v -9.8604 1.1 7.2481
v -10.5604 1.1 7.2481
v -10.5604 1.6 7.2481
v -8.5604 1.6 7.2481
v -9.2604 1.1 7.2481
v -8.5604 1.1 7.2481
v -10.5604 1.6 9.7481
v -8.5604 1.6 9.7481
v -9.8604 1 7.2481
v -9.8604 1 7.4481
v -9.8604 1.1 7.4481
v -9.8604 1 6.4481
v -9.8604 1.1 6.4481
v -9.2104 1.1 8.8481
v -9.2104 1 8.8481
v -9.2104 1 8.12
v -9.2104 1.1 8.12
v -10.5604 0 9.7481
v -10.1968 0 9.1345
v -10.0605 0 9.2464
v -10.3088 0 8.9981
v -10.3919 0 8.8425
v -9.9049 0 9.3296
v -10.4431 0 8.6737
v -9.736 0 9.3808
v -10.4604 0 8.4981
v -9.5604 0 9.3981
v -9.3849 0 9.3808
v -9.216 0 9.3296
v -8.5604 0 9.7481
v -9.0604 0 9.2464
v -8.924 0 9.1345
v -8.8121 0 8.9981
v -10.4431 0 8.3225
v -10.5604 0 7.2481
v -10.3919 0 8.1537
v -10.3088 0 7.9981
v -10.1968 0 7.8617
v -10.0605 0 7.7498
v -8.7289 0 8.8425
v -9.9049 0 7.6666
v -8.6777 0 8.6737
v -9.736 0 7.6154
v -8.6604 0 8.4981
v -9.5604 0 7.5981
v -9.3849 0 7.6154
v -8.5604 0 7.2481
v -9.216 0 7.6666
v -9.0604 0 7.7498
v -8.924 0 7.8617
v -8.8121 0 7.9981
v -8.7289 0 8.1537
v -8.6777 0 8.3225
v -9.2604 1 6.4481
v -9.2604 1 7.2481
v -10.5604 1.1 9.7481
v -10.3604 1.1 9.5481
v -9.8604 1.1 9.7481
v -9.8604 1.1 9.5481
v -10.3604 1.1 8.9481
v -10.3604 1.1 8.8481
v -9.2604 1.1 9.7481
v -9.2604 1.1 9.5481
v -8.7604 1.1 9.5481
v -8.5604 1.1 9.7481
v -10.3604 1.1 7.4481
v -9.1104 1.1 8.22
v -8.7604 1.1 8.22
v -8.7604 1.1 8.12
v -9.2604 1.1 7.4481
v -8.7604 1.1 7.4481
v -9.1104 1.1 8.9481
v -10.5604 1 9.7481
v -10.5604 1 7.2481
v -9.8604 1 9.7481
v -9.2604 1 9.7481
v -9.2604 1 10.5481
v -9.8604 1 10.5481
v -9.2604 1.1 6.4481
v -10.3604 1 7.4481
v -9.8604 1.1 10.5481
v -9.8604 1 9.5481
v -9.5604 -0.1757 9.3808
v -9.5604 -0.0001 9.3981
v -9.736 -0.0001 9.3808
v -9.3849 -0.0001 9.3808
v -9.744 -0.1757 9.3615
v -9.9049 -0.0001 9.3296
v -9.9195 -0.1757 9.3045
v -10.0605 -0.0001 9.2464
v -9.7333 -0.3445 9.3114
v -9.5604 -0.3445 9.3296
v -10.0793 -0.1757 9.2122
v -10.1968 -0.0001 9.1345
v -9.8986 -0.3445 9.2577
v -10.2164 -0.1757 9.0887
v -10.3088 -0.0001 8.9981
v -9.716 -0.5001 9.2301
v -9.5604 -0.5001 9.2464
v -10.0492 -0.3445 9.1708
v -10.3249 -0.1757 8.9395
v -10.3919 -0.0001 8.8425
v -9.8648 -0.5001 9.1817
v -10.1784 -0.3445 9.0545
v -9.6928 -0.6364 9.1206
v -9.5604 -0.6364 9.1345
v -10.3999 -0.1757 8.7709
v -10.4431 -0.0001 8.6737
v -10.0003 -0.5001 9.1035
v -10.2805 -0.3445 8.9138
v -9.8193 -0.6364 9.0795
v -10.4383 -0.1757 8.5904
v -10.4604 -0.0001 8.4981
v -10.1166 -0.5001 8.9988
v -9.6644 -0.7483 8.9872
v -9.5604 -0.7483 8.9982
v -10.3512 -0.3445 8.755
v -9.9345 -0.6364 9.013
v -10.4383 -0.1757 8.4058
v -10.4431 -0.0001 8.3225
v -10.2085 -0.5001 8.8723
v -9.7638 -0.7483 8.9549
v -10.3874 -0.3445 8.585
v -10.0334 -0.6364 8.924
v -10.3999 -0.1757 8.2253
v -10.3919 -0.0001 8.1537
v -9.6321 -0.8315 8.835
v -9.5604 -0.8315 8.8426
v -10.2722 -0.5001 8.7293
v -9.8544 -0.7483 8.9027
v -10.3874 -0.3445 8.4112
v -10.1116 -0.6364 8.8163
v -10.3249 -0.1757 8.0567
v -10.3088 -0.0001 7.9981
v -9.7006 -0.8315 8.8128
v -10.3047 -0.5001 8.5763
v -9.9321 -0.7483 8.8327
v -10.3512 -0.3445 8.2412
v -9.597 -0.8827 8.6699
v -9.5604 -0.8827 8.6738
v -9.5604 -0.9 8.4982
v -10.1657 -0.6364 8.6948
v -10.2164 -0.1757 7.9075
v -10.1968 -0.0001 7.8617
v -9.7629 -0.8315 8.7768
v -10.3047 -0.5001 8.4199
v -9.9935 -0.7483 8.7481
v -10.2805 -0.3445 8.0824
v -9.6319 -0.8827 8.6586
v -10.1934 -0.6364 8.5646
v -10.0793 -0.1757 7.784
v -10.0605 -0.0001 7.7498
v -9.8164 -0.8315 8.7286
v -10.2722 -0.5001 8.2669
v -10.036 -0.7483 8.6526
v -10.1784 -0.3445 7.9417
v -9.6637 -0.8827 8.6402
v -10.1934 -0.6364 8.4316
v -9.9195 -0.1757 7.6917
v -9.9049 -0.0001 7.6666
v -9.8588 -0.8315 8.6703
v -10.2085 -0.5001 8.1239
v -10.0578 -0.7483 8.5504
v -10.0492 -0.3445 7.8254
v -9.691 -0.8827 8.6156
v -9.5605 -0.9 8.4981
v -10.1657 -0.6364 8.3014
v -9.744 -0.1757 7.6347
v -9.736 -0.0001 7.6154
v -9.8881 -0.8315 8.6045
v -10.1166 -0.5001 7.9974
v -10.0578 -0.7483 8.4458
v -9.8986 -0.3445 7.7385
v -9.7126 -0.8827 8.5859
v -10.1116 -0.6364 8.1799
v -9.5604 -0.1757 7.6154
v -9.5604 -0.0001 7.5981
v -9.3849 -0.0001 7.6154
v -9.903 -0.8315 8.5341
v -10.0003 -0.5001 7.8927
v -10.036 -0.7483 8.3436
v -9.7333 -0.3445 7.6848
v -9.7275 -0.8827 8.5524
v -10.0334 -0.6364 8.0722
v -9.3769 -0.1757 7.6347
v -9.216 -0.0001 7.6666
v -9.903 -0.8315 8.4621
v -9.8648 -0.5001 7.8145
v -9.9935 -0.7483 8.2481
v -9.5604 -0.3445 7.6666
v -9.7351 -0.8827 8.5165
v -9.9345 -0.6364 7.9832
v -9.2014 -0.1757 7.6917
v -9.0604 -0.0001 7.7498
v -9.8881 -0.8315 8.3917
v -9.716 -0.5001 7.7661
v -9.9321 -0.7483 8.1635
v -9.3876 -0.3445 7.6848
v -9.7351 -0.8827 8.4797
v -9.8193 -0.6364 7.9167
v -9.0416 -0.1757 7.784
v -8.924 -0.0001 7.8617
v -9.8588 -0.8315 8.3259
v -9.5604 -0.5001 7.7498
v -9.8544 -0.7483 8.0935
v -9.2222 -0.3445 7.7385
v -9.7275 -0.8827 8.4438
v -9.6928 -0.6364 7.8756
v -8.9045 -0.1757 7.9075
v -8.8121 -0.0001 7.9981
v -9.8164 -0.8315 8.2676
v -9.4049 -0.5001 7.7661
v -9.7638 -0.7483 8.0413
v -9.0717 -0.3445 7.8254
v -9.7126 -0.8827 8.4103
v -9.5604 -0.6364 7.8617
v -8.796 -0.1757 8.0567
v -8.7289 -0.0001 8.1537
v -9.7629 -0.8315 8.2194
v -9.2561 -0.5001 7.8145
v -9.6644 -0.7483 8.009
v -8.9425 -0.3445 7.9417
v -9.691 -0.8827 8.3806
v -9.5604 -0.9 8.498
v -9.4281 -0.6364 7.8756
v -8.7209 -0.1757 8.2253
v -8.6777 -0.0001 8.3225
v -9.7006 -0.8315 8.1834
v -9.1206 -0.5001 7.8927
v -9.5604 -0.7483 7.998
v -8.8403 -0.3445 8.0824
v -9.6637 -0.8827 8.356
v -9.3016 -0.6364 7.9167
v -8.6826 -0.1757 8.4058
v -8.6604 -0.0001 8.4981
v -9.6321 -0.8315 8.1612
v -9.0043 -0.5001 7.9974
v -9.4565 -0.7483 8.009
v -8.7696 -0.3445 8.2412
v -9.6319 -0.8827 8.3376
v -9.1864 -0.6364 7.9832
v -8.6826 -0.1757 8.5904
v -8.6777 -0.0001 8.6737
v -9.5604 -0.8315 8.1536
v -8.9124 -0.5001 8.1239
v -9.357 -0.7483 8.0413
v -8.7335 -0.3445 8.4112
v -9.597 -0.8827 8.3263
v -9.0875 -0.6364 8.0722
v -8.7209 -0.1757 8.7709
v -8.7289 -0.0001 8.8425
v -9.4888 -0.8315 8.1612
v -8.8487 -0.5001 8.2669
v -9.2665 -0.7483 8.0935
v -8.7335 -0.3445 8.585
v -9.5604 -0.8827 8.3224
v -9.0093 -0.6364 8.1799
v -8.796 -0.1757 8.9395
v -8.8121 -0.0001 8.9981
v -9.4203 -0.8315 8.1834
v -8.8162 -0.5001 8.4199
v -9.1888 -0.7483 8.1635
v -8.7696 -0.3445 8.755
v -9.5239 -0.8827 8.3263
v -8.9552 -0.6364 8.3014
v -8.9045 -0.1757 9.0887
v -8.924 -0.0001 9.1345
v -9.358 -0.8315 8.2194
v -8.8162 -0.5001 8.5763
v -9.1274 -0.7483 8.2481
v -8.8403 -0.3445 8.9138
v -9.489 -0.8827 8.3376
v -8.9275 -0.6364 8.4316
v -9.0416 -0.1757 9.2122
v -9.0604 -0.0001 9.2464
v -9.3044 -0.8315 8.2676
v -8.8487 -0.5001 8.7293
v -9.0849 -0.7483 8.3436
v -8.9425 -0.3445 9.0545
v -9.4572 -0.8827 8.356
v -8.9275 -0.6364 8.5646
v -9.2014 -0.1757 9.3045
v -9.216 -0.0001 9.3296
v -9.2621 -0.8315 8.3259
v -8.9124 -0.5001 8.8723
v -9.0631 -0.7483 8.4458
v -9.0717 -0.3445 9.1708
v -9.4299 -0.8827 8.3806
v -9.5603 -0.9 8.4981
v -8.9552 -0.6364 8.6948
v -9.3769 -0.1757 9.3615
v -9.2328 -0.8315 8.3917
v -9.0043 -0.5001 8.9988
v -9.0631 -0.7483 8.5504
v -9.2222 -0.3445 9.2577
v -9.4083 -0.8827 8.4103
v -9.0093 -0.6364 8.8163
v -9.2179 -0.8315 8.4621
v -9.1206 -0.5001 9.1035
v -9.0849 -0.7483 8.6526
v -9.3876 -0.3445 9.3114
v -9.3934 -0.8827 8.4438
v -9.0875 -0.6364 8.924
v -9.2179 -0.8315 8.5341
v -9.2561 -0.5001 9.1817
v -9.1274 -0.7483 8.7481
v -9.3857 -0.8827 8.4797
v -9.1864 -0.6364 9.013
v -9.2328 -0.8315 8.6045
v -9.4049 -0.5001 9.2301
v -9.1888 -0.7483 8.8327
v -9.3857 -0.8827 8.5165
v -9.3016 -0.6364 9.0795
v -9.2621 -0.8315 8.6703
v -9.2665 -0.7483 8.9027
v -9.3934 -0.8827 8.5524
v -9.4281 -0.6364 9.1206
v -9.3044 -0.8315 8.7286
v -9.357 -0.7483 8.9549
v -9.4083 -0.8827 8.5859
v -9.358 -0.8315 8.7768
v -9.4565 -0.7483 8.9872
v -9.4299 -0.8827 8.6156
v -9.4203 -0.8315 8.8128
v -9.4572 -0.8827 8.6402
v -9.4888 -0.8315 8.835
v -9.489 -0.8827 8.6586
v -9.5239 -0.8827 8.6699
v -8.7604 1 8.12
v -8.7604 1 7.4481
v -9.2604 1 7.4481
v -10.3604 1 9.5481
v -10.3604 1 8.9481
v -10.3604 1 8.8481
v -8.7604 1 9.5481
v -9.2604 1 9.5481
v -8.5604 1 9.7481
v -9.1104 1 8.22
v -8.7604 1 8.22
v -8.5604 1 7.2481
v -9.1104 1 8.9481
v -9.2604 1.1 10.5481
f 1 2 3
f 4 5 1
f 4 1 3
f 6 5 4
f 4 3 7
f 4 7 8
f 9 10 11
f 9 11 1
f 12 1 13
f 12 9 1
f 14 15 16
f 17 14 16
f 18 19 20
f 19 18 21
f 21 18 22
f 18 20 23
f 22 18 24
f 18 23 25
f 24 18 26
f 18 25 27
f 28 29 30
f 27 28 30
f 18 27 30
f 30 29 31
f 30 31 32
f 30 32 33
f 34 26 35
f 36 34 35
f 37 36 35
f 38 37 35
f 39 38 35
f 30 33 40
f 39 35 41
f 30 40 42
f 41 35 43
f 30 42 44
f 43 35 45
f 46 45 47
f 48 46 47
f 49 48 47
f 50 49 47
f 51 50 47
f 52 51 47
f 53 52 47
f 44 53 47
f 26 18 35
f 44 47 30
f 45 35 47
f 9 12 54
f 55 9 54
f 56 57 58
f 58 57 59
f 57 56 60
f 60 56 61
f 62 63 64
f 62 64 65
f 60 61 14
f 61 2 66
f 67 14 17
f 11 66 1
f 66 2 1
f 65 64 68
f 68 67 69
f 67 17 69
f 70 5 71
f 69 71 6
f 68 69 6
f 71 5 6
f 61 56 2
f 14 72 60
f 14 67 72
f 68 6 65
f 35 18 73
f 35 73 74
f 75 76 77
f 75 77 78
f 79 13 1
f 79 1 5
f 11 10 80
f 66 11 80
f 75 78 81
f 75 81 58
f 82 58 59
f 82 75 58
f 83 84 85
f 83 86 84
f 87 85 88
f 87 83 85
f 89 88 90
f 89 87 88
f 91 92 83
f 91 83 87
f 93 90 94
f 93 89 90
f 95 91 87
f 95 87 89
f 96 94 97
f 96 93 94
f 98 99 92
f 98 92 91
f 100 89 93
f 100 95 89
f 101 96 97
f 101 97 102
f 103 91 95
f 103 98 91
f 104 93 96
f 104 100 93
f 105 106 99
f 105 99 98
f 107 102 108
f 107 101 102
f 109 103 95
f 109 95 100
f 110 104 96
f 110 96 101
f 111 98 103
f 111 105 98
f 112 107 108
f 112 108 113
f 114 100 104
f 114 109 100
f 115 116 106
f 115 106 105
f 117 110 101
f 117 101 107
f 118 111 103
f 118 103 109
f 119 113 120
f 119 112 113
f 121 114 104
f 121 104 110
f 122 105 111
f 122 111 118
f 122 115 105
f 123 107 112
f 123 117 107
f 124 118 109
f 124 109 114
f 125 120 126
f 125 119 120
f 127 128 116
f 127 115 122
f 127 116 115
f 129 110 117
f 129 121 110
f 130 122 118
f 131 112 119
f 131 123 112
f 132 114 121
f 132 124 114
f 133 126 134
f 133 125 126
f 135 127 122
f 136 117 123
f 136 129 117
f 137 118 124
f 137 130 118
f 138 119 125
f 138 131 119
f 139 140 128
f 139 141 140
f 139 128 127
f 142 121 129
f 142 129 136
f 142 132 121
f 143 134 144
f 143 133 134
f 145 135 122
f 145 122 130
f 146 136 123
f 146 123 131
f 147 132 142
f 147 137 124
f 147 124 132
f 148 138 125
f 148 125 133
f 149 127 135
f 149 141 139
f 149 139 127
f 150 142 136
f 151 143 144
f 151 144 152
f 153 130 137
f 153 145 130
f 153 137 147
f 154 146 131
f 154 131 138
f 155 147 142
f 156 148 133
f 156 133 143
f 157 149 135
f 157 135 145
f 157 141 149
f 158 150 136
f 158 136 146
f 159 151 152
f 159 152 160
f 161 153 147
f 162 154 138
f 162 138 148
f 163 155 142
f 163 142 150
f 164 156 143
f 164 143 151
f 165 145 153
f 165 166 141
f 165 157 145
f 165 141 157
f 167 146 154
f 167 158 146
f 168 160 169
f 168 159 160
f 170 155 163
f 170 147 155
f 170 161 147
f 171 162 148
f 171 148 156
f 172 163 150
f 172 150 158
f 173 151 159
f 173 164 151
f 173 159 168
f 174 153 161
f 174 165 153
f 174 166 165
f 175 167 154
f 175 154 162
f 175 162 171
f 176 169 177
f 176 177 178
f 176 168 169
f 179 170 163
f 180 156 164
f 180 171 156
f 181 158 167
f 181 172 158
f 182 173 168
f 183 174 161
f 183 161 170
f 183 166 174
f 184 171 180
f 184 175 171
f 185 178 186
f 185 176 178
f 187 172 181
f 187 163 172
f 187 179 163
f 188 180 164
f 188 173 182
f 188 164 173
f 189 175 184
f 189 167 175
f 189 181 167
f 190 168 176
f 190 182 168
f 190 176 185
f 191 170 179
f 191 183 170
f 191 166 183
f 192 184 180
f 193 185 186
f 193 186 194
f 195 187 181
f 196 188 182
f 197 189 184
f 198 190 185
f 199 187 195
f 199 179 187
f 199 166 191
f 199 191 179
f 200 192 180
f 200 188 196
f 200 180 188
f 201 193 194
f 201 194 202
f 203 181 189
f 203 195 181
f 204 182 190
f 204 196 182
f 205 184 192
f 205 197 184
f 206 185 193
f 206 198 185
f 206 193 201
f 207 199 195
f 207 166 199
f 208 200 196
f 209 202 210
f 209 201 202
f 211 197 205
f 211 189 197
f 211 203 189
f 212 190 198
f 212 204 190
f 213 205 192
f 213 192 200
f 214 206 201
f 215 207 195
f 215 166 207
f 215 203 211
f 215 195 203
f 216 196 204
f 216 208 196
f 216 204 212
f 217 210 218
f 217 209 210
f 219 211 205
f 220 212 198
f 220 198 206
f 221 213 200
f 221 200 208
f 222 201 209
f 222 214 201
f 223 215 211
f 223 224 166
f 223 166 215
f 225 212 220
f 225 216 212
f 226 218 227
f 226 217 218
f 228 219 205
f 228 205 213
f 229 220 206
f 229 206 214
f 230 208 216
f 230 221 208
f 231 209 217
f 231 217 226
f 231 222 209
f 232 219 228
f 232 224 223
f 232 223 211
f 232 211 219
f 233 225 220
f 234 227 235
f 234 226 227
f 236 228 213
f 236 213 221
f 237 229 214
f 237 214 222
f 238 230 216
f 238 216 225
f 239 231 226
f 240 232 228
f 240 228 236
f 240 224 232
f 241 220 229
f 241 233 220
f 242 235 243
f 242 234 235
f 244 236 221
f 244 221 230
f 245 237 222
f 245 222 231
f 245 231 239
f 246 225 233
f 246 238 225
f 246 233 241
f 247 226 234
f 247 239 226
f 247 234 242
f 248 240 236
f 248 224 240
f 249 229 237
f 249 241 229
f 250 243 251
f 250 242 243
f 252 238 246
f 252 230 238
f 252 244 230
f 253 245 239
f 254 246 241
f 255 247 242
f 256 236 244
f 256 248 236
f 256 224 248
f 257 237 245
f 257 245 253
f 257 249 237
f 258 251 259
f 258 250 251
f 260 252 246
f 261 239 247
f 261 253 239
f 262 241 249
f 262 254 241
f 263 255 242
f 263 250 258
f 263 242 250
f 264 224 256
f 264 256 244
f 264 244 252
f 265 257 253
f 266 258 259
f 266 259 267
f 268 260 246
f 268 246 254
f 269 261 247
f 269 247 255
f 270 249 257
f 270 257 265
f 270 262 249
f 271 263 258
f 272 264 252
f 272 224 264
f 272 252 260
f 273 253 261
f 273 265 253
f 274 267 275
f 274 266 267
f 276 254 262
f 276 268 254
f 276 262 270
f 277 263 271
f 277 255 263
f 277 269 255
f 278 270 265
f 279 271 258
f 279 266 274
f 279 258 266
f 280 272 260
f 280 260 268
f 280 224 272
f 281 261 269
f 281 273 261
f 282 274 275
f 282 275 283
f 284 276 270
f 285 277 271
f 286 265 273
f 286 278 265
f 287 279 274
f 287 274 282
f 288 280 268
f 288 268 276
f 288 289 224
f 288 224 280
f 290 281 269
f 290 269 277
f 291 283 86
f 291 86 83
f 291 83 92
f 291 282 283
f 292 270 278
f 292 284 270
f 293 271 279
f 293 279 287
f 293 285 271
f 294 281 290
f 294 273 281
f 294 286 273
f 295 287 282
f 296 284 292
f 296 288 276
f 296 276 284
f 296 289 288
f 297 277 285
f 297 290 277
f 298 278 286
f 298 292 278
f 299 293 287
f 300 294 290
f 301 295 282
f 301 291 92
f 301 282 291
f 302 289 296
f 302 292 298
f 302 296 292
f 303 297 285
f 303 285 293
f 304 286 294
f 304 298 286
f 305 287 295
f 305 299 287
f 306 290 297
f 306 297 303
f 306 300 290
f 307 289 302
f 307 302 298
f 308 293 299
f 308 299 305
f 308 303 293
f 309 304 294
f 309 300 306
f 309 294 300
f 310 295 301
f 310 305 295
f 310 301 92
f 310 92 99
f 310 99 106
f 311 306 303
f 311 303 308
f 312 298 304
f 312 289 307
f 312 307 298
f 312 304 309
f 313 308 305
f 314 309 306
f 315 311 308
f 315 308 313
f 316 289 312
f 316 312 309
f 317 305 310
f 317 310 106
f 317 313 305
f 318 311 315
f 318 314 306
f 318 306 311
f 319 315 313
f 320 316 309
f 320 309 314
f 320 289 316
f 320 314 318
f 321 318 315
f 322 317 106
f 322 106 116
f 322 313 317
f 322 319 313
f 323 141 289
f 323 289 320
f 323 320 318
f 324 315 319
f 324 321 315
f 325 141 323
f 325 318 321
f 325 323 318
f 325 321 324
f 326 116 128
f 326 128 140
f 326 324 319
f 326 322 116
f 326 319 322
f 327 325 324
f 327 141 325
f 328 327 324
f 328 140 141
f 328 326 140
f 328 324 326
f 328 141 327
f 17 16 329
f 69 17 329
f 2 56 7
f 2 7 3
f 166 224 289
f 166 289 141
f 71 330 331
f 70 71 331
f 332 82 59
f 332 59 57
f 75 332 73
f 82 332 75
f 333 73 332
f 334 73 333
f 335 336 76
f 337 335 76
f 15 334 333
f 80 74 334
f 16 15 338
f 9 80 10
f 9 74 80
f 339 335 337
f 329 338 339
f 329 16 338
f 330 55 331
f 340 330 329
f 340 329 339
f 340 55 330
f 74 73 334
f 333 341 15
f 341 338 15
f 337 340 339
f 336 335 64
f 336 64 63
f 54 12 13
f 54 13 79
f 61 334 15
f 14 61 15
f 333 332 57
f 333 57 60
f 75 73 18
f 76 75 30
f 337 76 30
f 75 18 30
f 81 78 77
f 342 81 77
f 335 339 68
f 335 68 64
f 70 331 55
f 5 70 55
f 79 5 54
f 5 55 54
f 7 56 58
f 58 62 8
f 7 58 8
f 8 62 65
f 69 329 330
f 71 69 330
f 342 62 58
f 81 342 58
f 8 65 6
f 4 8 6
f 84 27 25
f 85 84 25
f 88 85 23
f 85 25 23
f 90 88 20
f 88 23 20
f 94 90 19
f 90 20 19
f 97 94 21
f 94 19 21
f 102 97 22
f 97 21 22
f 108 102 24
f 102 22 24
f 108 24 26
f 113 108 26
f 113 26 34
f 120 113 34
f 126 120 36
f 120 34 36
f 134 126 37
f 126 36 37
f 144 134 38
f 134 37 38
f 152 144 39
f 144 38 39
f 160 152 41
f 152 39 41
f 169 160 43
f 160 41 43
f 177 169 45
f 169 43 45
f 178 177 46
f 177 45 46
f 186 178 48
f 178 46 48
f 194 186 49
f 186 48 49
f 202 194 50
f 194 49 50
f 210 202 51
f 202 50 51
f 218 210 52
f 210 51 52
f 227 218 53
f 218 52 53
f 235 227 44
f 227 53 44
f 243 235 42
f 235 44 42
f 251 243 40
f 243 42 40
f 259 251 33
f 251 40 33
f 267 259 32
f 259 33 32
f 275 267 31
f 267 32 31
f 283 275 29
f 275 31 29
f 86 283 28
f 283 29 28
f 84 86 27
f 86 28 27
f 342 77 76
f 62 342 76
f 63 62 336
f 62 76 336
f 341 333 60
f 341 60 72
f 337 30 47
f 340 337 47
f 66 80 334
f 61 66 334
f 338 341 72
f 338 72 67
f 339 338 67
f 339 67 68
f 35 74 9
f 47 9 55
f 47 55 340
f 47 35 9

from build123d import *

# Parameters (mm, degrees)
SCHIZZO1_W                   = 2
SCHIZZO1_H                   = 2.5
ESTRUSIONE_ESTRUSIONE1_DEPTH = 1
SCHIZZO2_R                   = 0.9
ESTRUSIONE_ESTRUSIONE2_DEPTH = 0.9
RACCORDO1_R                  = 0.9
SCHIZZO4_W                   = 0.6
SCHIZZO4_H                   = 1
ESTRUSIONE_ESTRUSIONE3_DEPTH = 0.1
SCHIZZO6_W                   = 2
SCHIZZO6_H                   = 2.5
ESTRUSIONE_ESTRUSIONE5_DEPTH = 0.5


with BuildPart() as part:
    # Schizzo1 → Estrusione-Estrusione1 (new body)
    with BuildSketch(Plane(origin=(0, 0, 0), x_dir=(1, 0, 0), z_dir=(0, 1, 0))):
        with Locations((-9.560441298, -8.49809966)):
            Rectangle(SCHIZZO1_W, SCHIZZO1_H)
    extrude(amount=ESTRUSIONE_ESTRUSIONE1_DEPTH)

    # Schizzo2 → Estrusione-Estrusione2 (add)
    with BuildSketch(Plane.XZ):
        with Locations(Location((-9.560441298, 8.49809966, 0), (0, 0, 90))):
            Circle(SCHIZZO2_R)
    extrude(amount=ESTRUSIONE_ESTRUSIONE2_DEPTH)

    # Raccordo1
    raccordo1_edges = [part.edges().sort_by_distance(p)[0] for p in [
        (-9.560441298, -0.9, 7.59809966),
    ]]
    fillet(raccordo1_edges, radius=RACCORDO1_R - 0.0001)  # a hair under: the kernel refuses the full size

    # Schizzo4 → Estrusione-Estrusione3 (add)
    with BuildSketch(Plane(origin=(0, 1, 0), x_dir=(1, 0, 0), z_dir=(0, 1, 0))):
        Polygon((-10.360441298, -8.84809966), (-9.210441298, -8.84809966), (-9.210441298, -8.1199702), (-8.760441298, -8.1199702), (-8.760441298, -7.44809966), (-10.360441298, -7.44809966), align=None)
        Polygon((-10.360441298, -8.94809966), (-9.110441298, -8.94809966), (-9.110441298, -8.2199702), (-8.760441298, -8.2199702), (-8.760441298, -9.54809966), (-10.360441298, -9.54809966), align=None)
        with Locations((-9.560441298, -10.04809966)):
            Rectangle(SCHIZZO4_W, SCHIZZO4_H)
        with Locations((-9.560441298, -6.94809966)):
            Rectangle(SCHIZZO4_W, SCHIZZO4_H)
    extrude(amount=ESTRUSIONE_ESTRUSIONE3_DEPTH)

    # Schizzo6 → Estrusione-Estrusione5 (add)
    with BuildSketch(Plane(origin=(0, 1.1, 0), x_dir=(1, 0, 0), z_dir=(0, 1, 0))):
        with Locations((-9.560441298, -8.49809966)):
            Rectangle(SCHIZZO6_W, SCHIZZO6_H)
    extrude(amount=ESTRUSIONE_ESTRUSIONE5_DEPTH)


solid = part.part
